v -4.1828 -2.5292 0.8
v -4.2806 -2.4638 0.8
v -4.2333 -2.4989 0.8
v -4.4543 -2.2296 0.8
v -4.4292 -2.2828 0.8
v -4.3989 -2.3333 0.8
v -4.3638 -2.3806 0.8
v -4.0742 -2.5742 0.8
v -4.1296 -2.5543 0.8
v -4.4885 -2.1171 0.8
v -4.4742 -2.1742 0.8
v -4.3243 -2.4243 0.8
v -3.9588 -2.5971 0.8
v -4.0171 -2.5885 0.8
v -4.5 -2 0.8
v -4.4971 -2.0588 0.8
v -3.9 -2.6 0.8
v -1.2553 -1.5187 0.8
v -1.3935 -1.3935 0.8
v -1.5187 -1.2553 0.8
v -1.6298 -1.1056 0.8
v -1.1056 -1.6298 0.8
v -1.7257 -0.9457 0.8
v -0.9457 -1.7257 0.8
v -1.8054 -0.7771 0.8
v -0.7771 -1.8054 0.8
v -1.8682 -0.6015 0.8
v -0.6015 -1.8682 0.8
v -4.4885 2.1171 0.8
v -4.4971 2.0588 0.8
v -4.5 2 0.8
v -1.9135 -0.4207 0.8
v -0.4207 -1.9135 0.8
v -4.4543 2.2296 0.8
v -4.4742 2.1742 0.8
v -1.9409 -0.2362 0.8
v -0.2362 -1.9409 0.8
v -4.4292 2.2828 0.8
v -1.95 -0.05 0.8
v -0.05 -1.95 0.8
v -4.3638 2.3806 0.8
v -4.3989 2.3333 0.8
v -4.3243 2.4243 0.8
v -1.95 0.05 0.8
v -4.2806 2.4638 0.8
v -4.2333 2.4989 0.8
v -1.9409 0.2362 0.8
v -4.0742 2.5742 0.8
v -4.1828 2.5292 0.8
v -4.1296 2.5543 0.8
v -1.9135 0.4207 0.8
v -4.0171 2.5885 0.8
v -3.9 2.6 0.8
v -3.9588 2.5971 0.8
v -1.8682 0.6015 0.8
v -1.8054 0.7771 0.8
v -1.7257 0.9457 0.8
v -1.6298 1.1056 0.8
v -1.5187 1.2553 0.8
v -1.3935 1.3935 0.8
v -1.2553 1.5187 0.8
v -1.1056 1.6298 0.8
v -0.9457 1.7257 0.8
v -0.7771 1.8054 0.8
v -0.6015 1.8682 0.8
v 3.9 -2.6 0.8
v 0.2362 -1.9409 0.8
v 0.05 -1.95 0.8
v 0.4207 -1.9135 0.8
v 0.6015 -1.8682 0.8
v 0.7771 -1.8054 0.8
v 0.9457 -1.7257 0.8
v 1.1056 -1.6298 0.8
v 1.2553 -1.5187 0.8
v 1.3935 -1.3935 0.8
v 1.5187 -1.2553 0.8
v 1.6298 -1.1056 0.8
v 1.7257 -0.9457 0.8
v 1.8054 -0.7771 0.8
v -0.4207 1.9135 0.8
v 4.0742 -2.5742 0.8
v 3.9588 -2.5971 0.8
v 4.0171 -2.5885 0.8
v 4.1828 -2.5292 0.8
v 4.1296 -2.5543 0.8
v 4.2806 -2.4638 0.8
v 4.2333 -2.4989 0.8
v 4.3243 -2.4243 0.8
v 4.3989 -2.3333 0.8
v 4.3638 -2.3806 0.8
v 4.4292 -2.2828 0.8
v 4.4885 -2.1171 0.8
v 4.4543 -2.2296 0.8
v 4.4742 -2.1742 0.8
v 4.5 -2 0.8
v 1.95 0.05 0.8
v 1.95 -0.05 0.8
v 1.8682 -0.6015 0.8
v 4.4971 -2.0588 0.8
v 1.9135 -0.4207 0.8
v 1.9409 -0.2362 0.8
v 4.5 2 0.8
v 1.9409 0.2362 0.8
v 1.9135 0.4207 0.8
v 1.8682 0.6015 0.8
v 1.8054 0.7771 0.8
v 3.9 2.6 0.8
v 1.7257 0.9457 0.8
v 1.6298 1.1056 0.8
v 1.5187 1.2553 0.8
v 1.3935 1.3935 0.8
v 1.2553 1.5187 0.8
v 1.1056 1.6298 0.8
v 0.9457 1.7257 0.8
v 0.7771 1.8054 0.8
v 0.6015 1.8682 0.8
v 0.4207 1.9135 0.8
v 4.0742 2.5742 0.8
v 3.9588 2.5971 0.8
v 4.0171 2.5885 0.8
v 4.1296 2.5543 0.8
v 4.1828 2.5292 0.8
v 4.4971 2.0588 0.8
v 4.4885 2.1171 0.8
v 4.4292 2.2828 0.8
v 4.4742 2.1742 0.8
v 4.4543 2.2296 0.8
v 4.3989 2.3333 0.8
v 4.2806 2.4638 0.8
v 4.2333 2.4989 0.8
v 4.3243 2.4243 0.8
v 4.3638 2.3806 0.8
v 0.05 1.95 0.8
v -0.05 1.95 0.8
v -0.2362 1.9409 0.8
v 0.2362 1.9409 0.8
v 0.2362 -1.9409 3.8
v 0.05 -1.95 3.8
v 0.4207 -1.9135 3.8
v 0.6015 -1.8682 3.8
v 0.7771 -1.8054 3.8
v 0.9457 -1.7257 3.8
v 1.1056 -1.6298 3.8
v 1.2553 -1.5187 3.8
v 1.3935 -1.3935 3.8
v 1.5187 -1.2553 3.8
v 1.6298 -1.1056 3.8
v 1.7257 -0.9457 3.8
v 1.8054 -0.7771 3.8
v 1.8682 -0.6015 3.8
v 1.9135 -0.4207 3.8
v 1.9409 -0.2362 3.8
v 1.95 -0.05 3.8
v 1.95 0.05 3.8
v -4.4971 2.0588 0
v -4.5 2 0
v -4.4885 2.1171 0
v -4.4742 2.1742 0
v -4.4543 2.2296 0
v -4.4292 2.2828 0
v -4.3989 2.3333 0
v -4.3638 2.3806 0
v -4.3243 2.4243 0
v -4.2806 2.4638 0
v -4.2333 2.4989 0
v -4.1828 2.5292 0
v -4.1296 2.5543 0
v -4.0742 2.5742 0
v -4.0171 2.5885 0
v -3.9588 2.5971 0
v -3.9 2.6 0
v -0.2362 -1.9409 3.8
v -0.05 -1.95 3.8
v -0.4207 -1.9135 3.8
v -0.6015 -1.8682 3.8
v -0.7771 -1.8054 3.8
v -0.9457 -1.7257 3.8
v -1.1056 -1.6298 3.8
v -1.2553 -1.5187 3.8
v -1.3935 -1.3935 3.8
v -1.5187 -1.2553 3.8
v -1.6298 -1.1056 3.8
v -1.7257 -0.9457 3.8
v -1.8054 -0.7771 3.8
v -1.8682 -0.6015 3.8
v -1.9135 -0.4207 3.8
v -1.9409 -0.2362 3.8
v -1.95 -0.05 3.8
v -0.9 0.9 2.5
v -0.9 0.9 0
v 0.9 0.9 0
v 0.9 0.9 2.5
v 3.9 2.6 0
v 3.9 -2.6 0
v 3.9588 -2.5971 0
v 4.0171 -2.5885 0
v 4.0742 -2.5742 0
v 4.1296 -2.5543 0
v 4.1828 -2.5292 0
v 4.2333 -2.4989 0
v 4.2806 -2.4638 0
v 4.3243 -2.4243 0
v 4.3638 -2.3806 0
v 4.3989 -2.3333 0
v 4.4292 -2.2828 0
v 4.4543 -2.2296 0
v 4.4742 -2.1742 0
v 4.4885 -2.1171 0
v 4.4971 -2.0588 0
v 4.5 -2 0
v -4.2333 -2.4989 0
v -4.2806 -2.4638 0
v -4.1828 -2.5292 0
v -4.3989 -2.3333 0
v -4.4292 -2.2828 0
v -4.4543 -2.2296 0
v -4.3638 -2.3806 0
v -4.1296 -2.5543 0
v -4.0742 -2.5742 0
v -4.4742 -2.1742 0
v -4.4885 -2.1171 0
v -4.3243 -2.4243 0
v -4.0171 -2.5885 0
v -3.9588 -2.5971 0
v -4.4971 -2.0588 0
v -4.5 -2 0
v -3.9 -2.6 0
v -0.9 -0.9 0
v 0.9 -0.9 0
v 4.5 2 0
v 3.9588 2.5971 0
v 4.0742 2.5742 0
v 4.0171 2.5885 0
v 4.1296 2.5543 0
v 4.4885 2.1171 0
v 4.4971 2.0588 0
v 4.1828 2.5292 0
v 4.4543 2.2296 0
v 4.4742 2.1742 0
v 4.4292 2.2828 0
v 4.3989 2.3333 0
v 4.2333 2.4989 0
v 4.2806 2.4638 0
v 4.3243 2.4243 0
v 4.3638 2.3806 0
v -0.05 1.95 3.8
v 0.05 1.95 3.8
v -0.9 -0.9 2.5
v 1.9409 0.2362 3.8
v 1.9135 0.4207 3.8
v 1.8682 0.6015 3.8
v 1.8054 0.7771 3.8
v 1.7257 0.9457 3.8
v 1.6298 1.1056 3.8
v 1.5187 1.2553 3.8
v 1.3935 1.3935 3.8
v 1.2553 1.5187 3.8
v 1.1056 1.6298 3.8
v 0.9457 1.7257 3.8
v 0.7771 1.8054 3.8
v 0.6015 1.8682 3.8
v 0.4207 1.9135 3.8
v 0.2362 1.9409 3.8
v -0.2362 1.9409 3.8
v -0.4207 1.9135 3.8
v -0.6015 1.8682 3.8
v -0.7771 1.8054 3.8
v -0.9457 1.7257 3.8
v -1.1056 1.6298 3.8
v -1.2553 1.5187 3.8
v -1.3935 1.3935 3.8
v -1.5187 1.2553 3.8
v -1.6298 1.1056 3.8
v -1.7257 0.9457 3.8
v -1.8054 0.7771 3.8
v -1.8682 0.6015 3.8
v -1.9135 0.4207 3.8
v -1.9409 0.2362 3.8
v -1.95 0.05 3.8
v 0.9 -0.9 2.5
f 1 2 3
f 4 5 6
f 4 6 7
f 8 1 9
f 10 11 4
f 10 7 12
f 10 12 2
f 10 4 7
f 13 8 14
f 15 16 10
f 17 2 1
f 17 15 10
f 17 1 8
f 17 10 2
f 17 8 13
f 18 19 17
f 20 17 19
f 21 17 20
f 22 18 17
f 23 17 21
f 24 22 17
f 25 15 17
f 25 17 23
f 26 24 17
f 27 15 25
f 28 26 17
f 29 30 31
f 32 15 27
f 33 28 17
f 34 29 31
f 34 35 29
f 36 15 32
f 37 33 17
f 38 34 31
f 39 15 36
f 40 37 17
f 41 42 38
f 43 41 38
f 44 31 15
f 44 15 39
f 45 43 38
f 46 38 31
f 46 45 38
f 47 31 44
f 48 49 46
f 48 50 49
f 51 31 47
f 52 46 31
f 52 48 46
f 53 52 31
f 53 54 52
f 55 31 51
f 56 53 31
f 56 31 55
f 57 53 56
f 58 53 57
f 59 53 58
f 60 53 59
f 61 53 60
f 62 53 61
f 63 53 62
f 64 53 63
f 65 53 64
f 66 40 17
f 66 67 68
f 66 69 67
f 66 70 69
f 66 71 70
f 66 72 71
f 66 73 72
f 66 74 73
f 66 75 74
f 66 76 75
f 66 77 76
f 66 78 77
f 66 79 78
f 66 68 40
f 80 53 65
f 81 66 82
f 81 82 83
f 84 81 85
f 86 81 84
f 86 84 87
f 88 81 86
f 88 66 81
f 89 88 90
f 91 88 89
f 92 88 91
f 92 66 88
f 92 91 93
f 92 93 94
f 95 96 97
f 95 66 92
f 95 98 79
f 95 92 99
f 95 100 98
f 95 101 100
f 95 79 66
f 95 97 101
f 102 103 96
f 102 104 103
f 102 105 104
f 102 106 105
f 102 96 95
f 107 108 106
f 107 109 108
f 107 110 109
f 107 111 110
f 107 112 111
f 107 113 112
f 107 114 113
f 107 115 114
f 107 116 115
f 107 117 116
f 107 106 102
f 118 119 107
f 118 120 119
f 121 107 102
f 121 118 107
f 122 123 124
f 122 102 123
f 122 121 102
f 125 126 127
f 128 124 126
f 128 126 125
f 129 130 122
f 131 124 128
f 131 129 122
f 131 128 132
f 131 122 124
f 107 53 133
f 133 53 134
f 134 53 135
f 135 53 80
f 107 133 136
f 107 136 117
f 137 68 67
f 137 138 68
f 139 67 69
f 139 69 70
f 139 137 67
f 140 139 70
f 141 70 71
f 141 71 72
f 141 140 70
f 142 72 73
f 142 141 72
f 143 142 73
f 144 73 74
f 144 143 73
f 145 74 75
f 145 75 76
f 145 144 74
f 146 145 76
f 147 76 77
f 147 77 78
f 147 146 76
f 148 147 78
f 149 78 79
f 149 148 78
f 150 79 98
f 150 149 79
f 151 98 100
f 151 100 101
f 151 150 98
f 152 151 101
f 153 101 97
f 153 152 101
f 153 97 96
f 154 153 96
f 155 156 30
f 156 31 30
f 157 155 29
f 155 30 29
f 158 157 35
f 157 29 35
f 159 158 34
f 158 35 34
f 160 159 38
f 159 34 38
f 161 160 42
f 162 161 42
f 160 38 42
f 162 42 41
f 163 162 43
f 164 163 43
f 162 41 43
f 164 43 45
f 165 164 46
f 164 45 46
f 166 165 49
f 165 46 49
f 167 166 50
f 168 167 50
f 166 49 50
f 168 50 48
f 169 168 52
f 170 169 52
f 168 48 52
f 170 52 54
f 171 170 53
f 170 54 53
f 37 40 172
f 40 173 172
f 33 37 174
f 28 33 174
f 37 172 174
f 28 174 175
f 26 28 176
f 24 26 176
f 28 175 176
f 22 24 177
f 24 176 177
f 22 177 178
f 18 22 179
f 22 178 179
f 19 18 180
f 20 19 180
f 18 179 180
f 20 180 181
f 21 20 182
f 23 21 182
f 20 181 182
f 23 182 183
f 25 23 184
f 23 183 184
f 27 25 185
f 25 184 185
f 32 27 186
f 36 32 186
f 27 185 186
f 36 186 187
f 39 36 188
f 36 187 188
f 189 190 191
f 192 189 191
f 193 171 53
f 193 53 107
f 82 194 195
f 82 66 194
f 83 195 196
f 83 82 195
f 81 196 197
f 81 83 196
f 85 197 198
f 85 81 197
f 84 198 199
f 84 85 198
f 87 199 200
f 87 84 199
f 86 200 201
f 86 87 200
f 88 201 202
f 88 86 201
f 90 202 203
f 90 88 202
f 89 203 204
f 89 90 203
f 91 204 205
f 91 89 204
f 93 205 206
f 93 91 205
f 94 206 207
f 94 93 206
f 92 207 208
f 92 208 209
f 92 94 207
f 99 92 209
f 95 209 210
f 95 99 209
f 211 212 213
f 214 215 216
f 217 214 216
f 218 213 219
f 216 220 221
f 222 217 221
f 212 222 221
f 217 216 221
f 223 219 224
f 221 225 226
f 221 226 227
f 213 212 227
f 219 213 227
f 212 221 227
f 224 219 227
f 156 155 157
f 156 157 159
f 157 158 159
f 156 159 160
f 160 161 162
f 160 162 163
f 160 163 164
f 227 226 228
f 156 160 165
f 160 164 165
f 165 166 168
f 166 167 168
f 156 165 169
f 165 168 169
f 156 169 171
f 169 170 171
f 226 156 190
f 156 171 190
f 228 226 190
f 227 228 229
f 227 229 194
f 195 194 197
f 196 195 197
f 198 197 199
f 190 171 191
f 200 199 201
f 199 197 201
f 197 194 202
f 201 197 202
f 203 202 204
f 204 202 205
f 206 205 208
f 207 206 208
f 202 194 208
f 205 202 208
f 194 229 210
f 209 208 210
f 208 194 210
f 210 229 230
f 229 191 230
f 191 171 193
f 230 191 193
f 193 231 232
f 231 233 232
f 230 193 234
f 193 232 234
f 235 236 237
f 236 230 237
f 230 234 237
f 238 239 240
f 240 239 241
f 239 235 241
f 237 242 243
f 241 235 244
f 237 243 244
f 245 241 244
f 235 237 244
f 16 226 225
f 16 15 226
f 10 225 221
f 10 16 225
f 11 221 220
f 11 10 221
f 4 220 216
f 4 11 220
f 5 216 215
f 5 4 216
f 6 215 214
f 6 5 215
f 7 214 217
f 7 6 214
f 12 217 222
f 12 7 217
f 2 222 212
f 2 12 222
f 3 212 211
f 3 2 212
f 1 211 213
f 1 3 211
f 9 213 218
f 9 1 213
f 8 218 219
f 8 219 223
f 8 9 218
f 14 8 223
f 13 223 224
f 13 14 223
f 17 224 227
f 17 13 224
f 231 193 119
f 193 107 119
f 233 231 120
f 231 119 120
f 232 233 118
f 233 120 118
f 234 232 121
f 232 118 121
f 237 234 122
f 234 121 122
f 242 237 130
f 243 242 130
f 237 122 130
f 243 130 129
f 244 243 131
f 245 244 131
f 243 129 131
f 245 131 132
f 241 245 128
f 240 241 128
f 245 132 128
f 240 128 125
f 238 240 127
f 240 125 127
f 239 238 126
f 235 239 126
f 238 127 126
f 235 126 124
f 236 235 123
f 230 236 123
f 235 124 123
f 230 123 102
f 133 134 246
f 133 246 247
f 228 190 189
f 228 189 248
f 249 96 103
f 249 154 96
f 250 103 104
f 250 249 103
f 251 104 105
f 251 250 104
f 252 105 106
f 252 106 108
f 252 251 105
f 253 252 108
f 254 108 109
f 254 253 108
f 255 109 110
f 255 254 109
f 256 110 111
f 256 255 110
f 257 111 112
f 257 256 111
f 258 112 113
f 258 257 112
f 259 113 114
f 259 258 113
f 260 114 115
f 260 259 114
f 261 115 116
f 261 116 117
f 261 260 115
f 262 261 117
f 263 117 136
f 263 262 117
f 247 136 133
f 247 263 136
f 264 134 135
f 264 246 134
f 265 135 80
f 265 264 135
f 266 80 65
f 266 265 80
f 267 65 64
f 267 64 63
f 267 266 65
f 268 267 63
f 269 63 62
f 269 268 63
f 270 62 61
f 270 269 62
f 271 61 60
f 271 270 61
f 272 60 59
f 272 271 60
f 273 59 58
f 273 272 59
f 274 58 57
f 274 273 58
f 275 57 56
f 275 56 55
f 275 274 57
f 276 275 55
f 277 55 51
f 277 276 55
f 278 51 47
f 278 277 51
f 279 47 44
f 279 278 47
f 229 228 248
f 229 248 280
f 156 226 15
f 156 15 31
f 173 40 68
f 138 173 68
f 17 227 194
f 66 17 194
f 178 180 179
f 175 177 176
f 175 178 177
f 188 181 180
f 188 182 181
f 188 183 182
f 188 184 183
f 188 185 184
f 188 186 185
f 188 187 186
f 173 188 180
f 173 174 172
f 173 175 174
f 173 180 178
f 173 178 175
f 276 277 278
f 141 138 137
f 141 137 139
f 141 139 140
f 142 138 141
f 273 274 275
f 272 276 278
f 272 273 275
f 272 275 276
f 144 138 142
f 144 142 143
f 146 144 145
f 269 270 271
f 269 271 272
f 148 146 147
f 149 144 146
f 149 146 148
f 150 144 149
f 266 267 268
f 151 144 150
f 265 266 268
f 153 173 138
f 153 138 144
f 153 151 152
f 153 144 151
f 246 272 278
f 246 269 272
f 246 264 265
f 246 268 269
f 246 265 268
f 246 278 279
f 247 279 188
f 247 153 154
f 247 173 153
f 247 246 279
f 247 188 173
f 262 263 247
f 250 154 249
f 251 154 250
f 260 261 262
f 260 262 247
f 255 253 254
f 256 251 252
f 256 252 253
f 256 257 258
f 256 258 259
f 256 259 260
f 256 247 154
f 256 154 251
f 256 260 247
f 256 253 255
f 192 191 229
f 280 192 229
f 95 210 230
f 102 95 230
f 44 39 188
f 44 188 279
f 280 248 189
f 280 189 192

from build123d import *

# Parameters (mm, degrees)
F0_W     = 9
F0_H     = 5.2
F1_DEPTH = 0.8
F2_W     = 3.9
F2_H     = 3.9
F3_DEPTH = 3
F4_R     = 1.9
F5_R     = 0.6
F6_W     = 1.8
F6_H     = 1.8
F7_DEPTH = 2.5


with BuildPart() as f1:
    # F0 (on Top) → F1 (new body)
    with BuildSketch(Plane.XY):
        Rectangle(F0_W, F0_H)
    extrude(amount=F1_DEPTH)

    # F2 (on face) → F3 (join)
    with BuildSketch(Plane.XY.offset(0.8)):
        Rectangle(F2_W, F2_H)
    extrude(amount=F3_DEPTH)

    # F4
    f4_edges = [f1.edges().sort_by_distance(p)[0] for p in [
        (-1.95, -1.95, 2.3),
        (-1.95, 1.95, 2.3),
        (1.95, -1.95, 2.3),
        (1.95, 1.95, 2.3),
    ]]
    fillet(f4_edges, radius=F4_R)

    # F5
    f5_edges = [f1.edges().sort_by_distance(p)[0] for p in [
        (-4.5, -2.6, 0.4),
        (-4.5, 2.6, 0.4),
        (4.5, -2.6, 0.4),
        (4.5, 2.6, 0.4),
    ]]
    fillet(f5_edges, radius=F5_R)

    # F6 (on face) → F7 (cut)
    with BuildSketch(Plane(origin=(0, 0, 0), x_dir=(1, 0, 0), z_dir=(0, 0, -1))):
        Rectangle(F6_W, F6_H)
    extrude(amount=-F7_DEPTH, mode=Mode.SUBTRACT)


solid = f1.part
